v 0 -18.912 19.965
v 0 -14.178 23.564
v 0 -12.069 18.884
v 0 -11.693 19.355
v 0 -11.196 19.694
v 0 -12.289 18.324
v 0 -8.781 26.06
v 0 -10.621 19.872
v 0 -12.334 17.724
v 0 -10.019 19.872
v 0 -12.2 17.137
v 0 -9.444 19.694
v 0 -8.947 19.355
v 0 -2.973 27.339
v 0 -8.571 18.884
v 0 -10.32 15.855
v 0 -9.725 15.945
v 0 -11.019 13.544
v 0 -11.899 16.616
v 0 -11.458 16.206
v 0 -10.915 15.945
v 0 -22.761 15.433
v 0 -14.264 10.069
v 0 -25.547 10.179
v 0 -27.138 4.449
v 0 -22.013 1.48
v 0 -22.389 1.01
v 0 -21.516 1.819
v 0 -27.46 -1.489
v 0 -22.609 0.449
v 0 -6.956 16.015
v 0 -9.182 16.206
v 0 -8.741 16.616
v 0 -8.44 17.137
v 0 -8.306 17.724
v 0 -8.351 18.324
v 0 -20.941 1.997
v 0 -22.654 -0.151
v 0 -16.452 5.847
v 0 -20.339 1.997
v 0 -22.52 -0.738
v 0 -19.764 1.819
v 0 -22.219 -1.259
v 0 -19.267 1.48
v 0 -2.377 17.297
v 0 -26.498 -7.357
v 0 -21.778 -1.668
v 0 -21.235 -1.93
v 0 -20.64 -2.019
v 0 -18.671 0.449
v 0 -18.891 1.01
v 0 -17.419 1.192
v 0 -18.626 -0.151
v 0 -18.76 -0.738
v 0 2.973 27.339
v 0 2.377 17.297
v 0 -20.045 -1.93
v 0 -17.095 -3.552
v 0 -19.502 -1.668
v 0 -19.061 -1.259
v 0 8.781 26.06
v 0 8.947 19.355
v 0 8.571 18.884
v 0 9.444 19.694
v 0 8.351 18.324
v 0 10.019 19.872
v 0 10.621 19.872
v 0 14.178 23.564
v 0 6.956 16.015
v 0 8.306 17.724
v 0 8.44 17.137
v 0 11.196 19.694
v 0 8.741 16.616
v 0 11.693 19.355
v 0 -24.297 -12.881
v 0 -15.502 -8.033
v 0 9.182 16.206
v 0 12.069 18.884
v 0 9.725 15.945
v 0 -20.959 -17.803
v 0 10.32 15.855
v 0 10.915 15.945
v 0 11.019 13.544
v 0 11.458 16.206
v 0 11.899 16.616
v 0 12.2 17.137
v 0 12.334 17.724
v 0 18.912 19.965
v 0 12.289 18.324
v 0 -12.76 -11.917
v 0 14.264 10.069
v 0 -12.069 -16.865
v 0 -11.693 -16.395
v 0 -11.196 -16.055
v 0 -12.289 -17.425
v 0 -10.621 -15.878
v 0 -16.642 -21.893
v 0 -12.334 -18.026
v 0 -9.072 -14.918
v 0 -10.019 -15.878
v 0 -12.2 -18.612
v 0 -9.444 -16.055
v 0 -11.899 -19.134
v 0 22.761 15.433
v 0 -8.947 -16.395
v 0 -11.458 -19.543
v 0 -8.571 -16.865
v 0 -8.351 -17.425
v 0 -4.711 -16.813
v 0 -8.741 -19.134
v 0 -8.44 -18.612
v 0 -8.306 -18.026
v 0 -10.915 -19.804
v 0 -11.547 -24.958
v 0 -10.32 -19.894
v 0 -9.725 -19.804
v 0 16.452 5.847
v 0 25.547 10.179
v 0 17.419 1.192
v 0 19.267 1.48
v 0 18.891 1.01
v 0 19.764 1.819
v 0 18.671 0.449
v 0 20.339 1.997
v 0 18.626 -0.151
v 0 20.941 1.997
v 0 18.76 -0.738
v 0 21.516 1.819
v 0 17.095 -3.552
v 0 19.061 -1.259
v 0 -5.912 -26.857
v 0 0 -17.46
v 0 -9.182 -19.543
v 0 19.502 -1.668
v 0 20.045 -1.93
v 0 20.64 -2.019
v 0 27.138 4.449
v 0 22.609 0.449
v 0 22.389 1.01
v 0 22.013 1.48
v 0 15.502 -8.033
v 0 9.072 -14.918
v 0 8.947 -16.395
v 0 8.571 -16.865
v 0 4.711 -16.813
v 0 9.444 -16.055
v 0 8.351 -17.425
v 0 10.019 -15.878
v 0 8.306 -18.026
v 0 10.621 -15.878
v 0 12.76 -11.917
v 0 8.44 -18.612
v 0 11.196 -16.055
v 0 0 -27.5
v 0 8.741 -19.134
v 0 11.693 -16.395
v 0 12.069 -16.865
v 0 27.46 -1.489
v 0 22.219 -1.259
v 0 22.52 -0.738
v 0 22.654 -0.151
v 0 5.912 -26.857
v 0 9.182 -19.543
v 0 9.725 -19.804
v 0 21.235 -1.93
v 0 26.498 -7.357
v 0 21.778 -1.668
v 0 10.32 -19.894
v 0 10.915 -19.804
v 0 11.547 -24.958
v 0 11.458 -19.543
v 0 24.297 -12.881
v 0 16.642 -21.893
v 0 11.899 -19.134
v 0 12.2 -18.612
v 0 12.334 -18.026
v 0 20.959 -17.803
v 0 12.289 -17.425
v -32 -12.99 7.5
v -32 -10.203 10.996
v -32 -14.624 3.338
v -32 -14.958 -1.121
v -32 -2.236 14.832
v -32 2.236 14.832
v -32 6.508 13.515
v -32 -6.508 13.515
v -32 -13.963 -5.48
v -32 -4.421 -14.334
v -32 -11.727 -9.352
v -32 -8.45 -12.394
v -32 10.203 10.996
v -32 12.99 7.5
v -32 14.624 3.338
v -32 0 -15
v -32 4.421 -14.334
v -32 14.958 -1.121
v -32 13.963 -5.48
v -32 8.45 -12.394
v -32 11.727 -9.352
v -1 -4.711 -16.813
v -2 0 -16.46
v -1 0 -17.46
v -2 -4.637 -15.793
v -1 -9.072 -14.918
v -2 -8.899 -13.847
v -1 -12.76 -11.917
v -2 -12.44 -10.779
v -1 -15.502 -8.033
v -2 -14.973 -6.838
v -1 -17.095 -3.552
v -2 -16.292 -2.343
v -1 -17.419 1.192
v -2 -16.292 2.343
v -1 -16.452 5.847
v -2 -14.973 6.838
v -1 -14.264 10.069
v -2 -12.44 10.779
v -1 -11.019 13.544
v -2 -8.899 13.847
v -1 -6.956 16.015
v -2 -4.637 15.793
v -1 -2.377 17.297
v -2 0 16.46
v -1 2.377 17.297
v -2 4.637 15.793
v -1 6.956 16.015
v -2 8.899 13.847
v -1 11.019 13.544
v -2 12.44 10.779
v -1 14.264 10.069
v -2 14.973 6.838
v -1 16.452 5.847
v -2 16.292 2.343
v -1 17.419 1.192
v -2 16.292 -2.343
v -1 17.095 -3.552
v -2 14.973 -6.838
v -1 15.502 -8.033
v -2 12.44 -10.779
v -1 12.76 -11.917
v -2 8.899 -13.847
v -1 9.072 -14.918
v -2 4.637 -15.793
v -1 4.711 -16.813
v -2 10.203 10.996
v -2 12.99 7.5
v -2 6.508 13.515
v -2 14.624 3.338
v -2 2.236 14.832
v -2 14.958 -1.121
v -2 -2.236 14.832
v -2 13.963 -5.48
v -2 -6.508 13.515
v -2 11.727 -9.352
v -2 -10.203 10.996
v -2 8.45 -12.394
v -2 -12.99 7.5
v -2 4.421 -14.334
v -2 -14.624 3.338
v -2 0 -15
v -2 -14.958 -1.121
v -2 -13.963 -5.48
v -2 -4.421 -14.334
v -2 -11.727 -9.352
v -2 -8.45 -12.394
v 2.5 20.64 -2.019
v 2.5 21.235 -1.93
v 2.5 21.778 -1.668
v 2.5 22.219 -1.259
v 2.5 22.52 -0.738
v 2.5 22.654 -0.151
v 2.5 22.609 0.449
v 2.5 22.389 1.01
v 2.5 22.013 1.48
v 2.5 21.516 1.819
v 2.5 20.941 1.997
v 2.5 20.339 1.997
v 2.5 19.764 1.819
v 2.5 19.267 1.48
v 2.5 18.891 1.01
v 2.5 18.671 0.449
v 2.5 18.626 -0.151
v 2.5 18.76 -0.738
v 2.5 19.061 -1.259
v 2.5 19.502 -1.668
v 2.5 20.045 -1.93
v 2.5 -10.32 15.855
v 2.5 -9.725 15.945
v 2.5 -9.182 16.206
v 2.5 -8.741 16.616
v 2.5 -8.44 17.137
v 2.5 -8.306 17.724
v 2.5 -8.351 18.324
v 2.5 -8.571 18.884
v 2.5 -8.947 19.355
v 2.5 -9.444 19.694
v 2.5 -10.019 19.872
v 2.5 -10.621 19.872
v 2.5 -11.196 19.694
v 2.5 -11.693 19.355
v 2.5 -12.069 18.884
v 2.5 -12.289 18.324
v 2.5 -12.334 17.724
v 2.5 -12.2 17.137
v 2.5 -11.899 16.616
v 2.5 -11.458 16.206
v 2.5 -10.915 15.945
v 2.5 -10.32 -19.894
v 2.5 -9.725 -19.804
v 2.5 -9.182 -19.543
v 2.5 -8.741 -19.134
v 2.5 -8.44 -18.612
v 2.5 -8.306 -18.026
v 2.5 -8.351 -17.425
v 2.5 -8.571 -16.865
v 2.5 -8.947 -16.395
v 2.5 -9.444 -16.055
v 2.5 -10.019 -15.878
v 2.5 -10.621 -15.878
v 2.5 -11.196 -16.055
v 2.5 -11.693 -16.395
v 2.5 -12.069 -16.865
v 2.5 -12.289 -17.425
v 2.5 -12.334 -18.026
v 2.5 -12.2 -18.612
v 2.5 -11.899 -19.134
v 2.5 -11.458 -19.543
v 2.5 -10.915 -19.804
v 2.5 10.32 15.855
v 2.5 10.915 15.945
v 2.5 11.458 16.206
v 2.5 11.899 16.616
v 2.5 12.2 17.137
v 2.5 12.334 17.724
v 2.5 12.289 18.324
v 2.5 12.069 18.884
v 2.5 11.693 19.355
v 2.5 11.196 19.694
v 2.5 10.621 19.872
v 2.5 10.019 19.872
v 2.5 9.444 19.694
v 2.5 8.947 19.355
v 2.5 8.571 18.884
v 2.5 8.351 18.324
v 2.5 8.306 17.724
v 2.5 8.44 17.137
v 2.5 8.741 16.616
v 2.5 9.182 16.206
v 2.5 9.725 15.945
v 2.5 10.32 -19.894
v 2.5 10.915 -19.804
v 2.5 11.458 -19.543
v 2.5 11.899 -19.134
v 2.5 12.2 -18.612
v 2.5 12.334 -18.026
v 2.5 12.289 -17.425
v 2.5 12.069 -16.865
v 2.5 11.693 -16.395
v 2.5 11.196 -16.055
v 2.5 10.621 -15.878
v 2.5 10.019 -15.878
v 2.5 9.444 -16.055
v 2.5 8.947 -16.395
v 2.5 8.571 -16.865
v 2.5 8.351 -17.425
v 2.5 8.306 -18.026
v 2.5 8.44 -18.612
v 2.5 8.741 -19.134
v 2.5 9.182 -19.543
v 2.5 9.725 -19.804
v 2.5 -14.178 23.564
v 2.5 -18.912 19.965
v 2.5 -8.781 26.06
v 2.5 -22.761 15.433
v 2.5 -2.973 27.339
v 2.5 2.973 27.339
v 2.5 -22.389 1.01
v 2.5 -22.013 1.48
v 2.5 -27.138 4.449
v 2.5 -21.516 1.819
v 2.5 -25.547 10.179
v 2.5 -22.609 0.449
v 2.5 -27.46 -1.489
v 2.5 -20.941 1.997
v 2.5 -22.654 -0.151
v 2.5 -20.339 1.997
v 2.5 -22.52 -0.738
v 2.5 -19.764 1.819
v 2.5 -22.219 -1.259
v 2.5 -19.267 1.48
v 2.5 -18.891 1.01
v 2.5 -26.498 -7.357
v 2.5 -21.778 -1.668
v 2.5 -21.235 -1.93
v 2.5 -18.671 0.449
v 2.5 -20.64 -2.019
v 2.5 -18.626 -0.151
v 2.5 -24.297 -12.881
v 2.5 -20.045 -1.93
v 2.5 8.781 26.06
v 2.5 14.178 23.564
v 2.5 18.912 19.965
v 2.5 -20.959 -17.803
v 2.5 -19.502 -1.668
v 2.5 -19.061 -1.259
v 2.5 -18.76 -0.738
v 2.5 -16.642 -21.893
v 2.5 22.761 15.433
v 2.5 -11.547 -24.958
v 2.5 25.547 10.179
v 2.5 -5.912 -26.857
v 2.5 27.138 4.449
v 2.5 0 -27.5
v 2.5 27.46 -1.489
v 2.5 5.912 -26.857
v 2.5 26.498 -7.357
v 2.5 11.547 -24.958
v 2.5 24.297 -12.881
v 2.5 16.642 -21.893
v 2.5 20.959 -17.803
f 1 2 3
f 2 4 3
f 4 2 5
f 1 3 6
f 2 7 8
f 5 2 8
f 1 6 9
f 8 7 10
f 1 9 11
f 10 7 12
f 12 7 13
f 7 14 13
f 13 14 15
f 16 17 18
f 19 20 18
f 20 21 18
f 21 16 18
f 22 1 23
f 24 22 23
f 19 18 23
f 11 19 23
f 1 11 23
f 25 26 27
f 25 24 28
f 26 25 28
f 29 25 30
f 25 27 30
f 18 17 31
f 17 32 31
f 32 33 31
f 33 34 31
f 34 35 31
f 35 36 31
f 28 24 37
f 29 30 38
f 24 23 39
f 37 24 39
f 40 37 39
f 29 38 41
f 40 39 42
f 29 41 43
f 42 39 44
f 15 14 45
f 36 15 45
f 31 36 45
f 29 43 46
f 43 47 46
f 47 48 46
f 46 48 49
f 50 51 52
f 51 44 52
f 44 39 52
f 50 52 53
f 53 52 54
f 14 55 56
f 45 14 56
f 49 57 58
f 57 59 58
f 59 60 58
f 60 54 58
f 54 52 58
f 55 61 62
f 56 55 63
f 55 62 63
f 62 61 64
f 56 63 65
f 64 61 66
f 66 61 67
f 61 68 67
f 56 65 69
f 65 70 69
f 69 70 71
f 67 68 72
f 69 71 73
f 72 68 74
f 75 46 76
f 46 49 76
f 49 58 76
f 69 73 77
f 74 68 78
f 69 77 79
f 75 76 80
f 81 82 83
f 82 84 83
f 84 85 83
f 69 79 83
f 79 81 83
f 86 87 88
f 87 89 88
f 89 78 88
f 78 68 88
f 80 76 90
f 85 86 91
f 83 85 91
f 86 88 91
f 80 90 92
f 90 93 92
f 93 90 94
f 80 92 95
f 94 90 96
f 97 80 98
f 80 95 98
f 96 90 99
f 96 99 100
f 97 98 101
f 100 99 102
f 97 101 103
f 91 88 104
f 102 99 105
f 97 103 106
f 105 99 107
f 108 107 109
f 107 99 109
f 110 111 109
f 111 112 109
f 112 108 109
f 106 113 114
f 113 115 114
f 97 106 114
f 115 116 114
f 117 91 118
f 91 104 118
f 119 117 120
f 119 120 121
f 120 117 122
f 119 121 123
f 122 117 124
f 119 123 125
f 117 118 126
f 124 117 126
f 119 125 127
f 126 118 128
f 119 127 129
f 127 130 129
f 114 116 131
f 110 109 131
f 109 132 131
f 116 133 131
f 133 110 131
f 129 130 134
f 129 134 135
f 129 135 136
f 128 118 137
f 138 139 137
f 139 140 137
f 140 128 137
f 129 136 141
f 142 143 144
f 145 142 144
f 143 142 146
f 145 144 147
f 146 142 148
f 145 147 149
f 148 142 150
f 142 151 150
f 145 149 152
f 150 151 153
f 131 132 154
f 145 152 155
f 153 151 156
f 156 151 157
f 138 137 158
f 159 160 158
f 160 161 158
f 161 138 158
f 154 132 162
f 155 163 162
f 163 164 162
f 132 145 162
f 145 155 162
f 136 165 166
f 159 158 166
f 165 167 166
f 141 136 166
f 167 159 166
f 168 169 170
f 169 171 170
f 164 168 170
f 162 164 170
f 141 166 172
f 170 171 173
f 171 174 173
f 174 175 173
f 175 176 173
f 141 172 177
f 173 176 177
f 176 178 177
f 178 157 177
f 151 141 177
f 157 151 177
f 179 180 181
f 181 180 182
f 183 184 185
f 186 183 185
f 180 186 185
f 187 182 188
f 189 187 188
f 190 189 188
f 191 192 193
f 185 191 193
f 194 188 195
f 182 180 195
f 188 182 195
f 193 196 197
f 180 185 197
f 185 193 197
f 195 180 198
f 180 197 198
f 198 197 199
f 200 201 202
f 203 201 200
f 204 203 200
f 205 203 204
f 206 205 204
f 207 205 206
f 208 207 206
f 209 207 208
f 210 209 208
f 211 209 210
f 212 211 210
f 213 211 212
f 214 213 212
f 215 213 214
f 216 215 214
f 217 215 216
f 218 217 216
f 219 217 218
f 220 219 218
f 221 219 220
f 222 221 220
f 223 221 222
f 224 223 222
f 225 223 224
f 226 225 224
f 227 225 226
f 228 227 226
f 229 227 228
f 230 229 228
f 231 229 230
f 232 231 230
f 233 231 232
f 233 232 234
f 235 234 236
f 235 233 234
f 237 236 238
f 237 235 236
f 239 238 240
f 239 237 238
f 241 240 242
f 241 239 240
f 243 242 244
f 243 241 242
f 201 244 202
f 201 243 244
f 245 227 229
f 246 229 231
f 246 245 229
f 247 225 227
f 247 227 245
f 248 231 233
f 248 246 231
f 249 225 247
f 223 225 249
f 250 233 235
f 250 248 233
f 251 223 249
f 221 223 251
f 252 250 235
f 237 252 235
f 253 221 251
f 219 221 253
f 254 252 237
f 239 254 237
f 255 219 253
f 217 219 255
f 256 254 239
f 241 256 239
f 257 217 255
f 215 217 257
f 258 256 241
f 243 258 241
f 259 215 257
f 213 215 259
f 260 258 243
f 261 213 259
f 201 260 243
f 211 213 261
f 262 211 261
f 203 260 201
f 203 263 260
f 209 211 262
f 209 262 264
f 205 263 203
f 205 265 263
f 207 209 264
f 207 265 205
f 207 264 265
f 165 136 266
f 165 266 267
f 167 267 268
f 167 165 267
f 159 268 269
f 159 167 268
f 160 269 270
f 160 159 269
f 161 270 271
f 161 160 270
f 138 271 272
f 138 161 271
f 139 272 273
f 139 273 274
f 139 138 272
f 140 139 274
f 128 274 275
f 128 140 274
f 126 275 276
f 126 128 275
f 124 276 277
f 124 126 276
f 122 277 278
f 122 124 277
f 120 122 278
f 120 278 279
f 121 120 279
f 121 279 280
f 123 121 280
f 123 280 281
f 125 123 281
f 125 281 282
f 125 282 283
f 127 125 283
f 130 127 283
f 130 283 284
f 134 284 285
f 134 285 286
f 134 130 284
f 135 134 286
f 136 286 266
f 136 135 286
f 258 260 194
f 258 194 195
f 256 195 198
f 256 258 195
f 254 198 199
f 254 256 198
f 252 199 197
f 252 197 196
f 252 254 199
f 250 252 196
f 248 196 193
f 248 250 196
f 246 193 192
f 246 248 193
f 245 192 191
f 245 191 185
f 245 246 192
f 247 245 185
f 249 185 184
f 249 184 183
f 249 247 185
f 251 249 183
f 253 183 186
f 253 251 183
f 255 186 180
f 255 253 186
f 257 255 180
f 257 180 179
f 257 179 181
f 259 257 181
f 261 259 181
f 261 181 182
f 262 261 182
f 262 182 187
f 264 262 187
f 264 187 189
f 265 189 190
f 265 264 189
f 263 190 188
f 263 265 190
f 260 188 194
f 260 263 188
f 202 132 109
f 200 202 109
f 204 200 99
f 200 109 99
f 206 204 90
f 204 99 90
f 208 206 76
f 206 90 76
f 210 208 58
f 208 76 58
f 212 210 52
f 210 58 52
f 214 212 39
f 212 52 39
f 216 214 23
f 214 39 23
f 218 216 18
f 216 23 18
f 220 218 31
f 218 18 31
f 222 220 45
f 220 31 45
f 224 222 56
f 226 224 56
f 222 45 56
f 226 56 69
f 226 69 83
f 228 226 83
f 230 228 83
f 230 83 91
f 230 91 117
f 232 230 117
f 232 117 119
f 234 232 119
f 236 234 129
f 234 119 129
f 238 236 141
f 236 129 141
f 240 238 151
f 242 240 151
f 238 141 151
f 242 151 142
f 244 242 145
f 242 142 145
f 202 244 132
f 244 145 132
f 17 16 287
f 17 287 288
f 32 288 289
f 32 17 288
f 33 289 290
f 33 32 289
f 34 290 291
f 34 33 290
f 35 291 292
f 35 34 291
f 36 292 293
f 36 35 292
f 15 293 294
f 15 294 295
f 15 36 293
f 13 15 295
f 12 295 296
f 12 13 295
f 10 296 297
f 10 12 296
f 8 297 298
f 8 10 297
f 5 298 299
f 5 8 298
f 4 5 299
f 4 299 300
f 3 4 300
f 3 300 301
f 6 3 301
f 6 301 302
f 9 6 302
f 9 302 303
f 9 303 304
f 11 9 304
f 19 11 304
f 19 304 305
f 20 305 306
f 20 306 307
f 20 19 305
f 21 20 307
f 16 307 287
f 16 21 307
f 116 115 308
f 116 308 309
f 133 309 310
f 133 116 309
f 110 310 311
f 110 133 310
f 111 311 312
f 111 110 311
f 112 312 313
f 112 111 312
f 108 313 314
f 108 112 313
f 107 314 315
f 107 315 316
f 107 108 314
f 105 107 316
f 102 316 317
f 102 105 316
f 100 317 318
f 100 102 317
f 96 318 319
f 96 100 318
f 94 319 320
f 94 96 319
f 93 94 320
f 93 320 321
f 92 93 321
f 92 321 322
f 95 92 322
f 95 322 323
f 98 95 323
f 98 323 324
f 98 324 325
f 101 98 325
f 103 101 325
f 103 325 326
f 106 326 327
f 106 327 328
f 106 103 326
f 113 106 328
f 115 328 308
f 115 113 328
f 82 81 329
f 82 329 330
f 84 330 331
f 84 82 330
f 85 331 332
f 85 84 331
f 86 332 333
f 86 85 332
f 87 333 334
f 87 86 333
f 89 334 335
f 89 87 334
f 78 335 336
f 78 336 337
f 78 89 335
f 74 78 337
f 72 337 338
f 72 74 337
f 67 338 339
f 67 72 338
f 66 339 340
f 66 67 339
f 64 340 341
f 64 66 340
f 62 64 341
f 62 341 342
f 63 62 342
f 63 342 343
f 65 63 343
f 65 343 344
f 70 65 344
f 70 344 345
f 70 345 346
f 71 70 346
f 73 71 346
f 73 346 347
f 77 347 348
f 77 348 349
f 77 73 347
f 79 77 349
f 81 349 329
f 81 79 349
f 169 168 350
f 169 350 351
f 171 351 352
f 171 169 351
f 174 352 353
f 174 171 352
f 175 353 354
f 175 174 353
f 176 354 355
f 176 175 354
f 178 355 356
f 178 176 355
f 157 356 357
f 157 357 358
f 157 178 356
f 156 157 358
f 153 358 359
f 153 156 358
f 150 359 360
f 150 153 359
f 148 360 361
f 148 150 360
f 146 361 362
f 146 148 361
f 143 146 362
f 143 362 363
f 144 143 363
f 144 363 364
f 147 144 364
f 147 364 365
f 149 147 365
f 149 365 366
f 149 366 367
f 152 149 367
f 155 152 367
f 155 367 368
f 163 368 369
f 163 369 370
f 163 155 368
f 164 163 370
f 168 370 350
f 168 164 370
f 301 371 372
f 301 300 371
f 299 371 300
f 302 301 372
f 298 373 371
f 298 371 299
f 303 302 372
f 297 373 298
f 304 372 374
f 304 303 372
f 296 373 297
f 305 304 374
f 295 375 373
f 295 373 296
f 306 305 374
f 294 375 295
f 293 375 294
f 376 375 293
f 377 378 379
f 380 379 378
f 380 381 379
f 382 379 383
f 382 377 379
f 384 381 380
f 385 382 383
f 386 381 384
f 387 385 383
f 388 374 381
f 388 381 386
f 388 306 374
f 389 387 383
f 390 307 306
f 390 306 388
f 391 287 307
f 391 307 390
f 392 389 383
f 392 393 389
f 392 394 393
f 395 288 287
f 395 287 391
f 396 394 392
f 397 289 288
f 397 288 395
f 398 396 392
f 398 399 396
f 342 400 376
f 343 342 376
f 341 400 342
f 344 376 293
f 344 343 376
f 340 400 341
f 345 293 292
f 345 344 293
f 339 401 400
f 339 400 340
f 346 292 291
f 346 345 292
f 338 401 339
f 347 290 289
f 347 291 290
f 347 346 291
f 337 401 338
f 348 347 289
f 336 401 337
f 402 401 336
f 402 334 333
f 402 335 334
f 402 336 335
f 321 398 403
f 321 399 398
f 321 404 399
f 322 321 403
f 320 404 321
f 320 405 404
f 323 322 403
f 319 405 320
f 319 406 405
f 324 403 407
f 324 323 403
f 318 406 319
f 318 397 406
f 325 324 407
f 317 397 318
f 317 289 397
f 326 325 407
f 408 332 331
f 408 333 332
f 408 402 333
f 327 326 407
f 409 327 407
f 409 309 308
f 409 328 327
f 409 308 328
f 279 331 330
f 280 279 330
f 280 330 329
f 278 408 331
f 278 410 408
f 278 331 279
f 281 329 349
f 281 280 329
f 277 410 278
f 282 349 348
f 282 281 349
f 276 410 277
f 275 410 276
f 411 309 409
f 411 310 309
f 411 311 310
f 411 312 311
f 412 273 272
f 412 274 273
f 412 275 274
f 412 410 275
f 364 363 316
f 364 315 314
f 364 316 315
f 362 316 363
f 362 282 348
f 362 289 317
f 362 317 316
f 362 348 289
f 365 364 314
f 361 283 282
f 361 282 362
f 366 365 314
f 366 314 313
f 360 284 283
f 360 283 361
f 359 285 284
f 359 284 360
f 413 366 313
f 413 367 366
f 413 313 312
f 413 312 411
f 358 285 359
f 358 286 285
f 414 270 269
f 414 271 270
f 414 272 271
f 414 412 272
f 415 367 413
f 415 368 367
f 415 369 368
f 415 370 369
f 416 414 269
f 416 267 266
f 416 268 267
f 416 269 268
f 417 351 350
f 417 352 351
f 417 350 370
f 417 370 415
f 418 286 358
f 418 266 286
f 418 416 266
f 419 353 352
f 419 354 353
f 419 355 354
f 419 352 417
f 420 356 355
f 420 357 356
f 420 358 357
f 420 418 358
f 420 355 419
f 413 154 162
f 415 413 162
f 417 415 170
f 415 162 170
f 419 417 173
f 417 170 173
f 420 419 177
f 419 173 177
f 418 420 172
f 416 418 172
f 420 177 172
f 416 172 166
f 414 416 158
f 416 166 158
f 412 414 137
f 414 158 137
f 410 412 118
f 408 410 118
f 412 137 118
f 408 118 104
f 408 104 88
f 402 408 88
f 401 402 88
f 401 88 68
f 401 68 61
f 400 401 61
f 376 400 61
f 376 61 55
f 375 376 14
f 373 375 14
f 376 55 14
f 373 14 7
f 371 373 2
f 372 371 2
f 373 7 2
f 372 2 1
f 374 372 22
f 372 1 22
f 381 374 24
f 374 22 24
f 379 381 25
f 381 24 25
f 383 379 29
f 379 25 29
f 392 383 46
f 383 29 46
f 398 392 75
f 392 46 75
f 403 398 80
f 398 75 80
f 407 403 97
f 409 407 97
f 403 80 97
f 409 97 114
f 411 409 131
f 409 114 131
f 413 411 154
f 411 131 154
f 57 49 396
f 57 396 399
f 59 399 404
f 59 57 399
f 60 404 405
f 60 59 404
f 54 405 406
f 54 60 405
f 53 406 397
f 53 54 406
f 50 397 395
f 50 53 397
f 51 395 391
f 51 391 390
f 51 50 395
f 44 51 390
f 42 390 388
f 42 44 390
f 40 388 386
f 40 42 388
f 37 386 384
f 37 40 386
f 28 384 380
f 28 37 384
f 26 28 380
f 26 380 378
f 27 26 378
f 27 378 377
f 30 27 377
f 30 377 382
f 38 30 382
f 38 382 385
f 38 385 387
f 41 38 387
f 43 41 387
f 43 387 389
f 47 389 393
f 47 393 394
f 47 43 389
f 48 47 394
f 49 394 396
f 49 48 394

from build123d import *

# Parameters (mm, degrees)
SKETCH1_R           = 27.5
SKETCH1_R_2         = 2.0193
BOSS_EXTRUDE1_DEPTH = 2.5
SKETCH2_R           = 17.46
BOSS_EXTRUDE2_DEPTH = 2
CHAMFER5_SIZE       = 1
SKETCH6_R           = 15
BOSS_EXTRUDE3_DEPTH = 30


with BuildPart() as part:
    # Sketch1 → Boss-Extrude1 (new body)
    with BuildSketch(Plane(origin=(0, 0, 0), x_dir=(0, 0, -1), z_dir=(1, 0, 0))):
        Circle(SKETCH1_R)
        with Locations((0, 20.64)):
            Circle(SKETCH1_R_2, mode=Mode.SUBTRACT)
        with Locations((17.874764334, 10.32)):
            Circle(SKETCH1_R_2, mode=Mode.SUBTRACT)
        with Locations((17.874764334, -10.32)):
            Circle(SKETCH1_R_2, mode=Mode.SUBTRACT)
        with Locations((0, -20.64)):
            Circle(SKETCH1_R_2, mode=Mode.SUBTRACT)
        with Locations((-17.874764334, -10.32)):
            Circle(SKETCH1_R_2, mode=Mode.SUBTRACT)
        with Locations((-17.874764334, 10.32)):
            Circle(SKETCH1_R_2, mode=Mode.SUBTRACT)
    extrude(amount=BOSS_EXTRUDE1_DEPTH)

    # Sketch2 → Boss-Extrude2 (add)
    with BuildSketch(Plane.ZY):
        with Locations(Location((0, 0, 0), (0, 0, 180))):
            Circle(SKETCH2_R)
    extrude(amount=BOSS_EXTRUDE2_DEPTH)

    # Chamfer5
    chamfer5_edges = [part.edges().sort_by_distance(p)[0] for p in [
        (-2, 0, 17.46),
    ]]
    chamfer(chamfer5_edges, length=CHAMFER5_SIZE)

    # Sketch6 → Boss-Extrude3 (add)
    with BuildSketch(Plane(origin=(-2, 0, 0), x_dir=(0, 0, -1), z_dir=(1, 0, 0))):
        Circle(SKETCH6_R)
    extrude(amount=-BOSS_EXTRUDE3_DEPTH)


solid = part.part
